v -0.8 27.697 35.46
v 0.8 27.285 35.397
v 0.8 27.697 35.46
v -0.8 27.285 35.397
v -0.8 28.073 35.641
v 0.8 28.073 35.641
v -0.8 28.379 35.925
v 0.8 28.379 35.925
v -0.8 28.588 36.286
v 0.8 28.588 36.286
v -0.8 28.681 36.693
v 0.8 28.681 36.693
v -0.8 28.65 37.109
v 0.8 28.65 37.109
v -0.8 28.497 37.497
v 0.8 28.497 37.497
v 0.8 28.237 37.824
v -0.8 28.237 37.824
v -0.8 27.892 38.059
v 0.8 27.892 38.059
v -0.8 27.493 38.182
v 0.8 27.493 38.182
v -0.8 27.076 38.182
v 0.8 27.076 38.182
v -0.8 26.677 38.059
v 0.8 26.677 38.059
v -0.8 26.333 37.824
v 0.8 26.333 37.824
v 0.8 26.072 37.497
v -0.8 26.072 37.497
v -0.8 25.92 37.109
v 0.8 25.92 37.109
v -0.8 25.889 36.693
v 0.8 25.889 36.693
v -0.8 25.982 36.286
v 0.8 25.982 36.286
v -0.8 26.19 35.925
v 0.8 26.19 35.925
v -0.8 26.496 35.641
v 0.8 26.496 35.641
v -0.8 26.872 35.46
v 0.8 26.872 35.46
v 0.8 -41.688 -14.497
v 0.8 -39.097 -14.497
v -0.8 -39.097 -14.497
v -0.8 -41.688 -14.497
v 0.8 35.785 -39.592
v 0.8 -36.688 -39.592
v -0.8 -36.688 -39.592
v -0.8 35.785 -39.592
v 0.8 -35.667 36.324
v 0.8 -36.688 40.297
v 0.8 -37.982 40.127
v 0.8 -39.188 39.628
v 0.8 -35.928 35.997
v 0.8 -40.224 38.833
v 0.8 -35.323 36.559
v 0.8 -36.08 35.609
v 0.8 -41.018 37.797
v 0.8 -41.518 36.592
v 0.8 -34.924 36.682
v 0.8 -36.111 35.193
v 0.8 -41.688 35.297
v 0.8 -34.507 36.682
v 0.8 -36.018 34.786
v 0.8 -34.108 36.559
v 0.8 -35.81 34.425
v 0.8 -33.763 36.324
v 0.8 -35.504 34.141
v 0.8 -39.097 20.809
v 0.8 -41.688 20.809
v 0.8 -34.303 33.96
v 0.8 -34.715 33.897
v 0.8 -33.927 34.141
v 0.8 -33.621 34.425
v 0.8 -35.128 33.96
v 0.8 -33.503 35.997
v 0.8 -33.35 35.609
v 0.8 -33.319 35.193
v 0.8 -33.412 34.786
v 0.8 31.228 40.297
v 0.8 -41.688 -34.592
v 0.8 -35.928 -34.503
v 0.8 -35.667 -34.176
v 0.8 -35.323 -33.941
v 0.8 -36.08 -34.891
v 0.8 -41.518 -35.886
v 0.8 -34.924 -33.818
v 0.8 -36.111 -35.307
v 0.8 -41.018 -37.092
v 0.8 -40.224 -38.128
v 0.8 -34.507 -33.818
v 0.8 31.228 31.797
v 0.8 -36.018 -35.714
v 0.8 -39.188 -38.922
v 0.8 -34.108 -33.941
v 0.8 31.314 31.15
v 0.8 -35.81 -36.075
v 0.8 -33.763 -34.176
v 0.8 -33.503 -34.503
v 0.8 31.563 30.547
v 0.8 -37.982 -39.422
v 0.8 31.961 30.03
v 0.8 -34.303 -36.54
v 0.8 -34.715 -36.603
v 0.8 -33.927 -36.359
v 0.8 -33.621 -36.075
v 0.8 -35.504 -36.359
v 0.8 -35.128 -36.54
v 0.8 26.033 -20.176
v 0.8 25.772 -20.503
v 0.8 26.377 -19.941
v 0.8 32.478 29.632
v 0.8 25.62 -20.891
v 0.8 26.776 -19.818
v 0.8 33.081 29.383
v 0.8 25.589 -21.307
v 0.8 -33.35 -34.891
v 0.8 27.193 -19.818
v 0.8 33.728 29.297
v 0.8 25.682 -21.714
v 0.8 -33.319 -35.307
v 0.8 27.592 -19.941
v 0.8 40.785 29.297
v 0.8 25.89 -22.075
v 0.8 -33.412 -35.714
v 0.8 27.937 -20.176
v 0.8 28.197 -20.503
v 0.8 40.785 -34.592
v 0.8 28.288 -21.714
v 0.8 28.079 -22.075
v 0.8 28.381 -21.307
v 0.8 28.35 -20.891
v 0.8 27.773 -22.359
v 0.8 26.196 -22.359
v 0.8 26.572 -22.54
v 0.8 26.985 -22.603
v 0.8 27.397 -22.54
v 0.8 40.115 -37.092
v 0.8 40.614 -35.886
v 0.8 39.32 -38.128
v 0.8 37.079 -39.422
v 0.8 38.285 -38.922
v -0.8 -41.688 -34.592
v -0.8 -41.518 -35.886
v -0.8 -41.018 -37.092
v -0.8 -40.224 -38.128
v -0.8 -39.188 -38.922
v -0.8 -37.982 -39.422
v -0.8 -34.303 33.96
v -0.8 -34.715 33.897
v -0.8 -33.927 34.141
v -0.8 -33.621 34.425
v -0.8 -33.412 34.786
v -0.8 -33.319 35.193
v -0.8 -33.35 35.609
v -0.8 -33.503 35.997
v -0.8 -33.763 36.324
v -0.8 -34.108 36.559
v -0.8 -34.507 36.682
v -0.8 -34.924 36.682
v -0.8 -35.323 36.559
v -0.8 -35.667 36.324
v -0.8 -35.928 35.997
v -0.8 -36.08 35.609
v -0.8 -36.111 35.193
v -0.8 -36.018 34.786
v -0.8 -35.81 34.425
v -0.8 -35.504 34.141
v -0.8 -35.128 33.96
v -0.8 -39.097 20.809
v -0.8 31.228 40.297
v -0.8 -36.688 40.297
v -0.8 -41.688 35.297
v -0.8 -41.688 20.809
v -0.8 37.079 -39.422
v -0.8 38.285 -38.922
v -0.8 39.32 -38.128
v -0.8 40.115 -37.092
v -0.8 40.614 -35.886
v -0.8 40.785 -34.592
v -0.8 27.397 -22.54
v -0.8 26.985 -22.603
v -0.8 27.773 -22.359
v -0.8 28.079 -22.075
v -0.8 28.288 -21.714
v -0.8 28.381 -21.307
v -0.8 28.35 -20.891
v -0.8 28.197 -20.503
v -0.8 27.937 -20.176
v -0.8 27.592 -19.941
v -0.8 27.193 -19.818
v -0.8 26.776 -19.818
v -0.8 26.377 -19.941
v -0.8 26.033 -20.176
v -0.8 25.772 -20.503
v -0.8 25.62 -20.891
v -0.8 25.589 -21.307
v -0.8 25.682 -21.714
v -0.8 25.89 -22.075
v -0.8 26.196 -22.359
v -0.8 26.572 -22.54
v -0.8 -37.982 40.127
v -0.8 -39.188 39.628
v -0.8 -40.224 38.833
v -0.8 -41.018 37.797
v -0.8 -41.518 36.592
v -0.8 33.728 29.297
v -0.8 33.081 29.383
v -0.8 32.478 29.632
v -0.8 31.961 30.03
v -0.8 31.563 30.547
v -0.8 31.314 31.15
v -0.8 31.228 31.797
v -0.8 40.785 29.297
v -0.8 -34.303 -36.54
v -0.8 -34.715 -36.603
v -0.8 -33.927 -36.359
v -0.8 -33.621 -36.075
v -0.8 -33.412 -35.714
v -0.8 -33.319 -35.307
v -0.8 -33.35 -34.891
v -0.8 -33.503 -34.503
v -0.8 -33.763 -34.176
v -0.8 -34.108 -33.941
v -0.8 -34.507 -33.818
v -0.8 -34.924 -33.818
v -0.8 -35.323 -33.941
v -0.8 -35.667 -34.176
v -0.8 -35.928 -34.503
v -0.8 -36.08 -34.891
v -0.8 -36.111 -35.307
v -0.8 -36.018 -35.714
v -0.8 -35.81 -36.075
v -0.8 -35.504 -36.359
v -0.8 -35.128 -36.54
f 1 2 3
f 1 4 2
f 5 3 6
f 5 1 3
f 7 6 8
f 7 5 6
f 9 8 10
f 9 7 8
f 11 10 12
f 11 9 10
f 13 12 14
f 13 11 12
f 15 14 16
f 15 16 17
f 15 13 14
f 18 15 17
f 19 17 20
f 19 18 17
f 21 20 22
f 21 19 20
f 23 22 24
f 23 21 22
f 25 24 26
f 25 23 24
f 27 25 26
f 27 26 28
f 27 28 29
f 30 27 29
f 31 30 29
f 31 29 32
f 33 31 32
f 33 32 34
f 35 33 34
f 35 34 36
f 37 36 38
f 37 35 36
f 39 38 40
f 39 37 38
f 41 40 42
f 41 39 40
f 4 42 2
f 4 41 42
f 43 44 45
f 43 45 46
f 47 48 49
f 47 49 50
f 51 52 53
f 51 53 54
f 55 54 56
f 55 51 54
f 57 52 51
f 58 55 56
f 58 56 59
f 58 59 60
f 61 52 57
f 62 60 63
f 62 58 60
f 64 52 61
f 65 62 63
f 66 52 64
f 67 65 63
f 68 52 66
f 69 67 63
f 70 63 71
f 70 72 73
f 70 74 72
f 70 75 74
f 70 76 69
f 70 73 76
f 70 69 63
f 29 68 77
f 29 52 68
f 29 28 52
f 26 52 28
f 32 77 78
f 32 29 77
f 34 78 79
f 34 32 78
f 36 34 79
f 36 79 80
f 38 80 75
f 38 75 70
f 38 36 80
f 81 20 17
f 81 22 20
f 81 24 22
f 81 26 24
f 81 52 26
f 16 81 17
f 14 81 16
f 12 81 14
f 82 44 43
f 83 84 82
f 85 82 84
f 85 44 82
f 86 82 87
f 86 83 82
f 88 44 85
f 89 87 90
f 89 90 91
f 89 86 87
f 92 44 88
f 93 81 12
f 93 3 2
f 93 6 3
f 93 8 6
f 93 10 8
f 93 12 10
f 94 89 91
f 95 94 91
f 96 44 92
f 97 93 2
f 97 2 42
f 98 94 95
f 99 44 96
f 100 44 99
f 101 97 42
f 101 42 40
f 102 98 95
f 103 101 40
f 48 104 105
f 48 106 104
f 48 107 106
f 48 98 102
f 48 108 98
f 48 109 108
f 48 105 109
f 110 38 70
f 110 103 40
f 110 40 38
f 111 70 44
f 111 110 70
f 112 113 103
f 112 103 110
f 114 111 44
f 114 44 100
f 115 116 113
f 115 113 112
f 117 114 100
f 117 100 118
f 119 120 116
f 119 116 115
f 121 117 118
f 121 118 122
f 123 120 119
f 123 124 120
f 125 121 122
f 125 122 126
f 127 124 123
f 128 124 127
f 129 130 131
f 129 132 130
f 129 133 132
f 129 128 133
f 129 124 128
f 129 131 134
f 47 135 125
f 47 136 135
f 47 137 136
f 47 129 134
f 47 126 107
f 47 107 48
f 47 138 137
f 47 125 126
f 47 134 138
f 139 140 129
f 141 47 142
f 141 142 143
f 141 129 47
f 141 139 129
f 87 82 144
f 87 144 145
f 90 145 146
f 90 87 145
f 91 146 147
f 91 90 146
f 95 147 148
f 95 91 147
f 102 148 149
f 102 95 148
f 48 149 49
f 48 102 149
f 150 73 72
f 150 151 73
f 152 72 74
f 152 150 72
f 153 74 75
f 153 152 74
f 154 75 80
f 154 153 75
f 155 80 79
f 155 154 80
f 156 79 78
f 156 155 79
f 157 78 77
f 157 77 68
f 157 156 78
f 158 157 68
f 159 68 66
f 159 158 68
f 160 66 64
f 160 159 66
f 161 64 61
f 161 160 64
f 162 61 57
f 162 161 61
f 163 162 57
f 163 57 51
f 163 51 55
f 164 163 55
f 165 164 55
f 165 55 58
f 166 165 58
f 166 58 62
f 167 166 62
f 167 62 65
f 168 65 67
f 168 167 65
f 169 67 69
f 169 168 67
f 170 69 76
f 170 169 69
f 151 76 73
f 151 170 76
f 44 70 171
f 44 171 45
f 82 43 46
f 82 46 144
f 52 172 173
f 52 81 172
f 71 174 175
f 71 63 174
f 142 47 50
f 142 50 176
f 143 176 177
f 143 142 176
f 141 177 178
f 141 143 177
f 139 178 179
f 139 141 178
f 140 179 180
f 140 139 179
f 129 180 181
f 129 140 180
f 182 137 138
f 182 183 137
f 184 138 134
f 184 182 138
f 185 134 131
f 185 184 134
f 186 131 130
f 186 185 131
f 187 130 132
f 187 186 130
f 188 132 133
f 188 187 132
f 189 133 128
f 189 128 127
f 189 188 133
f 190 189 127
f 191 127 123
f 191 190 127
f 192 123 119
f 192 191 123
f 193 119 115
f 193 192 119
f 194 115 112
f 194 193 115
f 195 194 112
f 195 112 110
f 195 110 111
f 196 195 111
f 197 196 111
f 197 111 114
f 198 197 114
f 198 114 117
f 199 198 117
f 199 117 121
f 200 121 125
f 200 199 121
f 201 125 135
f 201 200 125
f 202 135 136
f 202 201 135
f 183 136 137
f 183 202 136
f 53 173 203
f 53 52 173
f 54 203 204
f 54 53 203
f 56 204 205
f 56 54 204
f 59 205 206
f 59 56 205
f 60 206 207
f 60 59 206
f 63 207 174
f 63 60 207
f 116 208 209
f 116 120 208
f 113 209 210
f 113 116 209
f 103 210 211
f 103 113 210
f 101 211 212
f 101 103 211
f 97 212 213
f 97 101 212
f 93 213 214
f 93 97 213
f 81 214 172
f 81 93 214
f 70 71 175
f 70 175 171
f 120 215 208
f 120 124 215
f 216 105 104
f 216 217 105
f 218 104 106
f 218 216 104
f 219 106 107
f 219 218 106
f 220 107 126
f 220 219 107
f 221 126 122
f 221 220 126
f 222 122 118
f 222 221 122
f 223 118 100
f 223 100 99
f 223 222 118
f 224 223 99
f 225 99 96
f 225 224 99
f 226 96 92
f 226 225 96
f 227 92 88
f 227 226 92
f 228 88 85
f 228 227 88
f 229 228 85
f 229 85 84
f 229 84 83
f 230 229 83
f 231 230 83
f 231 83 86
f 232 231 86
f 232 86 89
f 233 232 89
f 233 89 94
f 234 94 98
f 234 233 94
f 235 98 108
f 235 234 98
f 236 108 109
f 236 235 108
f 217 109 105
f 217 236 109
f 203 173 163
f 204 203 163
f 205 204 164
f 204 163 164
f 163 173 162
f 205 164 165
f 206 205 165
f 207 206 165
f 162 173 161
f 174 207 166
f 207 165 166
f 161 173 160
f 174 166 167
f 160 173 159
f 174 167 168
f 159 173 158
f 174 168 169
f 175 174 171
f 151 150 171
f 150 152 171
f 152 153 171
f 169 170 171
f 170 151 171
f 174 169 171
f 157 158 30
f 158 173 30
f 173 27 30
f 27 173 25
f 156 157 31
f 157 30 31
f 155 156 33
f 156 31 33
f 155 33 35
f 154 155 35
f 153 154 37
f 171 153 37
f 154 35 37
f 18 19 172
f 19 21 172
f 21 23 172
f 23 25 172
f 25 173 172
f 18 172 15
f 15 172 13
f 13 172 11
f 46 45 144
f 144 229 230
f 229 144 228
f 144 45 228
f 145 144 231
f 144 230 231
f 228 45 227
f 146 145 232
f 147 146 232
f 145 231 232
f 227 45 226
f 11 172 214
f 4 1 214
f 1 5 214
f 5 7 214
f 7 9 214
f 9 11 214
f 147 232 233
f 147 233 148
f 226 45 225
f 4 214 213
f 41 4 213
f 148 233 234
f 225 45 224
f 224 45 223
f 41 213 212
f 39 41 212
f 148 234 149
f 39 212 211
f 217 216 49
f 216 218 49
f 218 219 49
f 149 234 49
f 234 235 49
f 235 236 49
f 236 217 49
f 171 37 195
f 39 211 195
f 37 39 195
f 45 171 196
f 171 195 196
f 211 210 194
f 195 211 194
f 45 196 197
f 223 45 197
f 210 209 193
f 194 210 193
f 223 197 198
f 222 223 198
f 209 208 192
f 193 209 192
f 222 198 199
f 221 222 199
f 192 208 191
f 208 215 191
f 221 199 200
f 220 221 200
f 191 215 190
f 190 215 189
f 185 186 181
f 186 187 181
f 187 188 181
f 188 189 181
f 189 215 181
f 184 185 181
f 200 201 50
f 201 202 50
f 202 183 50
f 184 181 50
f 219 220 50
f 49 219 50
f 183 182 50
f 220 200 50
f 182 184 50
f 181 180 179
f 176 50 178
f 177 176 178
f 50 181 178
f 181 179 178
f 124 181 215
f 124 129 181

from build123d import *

# Parameters (mm, degrees)
SKETCH1_R           = 1.4
BOSS_EXTRUDE1_DEPTH = 0.8


with BuildPart() as part:
    # Sketch1 → Boss-Extrude1 (new, symmetric)
    with BuildSketch(Plane(origin=(0, 0, 0), x_dir=(0, 0, -1), z_dir=(1, 0, 0))):
        with BuildLine():
            Line((-35.297434934, -41.688153), (-20.809434934, -41.688153))
            Line((-20.809434934, -41.688153), (-20.809434934, -39.097053))
            Line((-20.809434934, -39.097053), (14.496565066, -39.097053))
            Line((14.496565066, -39.097053), (14.496565066, -41.688153))
            Line((14.496565066, -41.688153), (34.592039339, -41.688153))
            ThreePointArc((34.592039339, -41.688153), (38.127573245, -40.223686906), (39.592039339, -36.688153))
            Line((39.592039339, -36.688153), (39.592039339, 35.784769822))
            ThreePointArc((39.592039339, 35.784769822), (38.127573245, 39.320303728), (34.592039339, 40.784769822))
            Line((34.592039339, 40.784769822), (-29.297434934, 40.784769822))
            Line((-29.297434934, 40.784769822), (-29.297434934, 33.728413265))
            ThreePointArc((-29.297434934, 33.728413265), (-30.029667981, 31.960646312), (-31.797434934, 31.228413265))
            Line((-31.797434934, 31.228413265), (-40.297434934, 31.228413265))
            Line((-40.297434934, 31.228413265), (-40.297434934, -36.688153))
            ThreePointArc((-40.297434934, -36.688153), (-38.83296884, -40.223686906), (-35.297434934, -41.688153))
        make_face()
        with Locations((-36.797434934, 27.284769822)):
            Circle(SKETCH1_R, mode=Mode.SUBTRACT)
        with Locations((21.202565066, 26.984769822)):
            Circle(SKETCH1_R, mode=Mode.SUBTRACT)
        with Locations((-35.297434934, -34.715230178)):
            Circle(SKETCH1_R, mode=Mode.SUBTRACT)
        with Locations((35.202565066, -34.715230178)):
            Circle(SKETCH1_R, mode=Mode.SUBTRACT)
    extrude(amount=BOSS_EXTRUDE1_DEPTH, both=True)


solid = part.part
